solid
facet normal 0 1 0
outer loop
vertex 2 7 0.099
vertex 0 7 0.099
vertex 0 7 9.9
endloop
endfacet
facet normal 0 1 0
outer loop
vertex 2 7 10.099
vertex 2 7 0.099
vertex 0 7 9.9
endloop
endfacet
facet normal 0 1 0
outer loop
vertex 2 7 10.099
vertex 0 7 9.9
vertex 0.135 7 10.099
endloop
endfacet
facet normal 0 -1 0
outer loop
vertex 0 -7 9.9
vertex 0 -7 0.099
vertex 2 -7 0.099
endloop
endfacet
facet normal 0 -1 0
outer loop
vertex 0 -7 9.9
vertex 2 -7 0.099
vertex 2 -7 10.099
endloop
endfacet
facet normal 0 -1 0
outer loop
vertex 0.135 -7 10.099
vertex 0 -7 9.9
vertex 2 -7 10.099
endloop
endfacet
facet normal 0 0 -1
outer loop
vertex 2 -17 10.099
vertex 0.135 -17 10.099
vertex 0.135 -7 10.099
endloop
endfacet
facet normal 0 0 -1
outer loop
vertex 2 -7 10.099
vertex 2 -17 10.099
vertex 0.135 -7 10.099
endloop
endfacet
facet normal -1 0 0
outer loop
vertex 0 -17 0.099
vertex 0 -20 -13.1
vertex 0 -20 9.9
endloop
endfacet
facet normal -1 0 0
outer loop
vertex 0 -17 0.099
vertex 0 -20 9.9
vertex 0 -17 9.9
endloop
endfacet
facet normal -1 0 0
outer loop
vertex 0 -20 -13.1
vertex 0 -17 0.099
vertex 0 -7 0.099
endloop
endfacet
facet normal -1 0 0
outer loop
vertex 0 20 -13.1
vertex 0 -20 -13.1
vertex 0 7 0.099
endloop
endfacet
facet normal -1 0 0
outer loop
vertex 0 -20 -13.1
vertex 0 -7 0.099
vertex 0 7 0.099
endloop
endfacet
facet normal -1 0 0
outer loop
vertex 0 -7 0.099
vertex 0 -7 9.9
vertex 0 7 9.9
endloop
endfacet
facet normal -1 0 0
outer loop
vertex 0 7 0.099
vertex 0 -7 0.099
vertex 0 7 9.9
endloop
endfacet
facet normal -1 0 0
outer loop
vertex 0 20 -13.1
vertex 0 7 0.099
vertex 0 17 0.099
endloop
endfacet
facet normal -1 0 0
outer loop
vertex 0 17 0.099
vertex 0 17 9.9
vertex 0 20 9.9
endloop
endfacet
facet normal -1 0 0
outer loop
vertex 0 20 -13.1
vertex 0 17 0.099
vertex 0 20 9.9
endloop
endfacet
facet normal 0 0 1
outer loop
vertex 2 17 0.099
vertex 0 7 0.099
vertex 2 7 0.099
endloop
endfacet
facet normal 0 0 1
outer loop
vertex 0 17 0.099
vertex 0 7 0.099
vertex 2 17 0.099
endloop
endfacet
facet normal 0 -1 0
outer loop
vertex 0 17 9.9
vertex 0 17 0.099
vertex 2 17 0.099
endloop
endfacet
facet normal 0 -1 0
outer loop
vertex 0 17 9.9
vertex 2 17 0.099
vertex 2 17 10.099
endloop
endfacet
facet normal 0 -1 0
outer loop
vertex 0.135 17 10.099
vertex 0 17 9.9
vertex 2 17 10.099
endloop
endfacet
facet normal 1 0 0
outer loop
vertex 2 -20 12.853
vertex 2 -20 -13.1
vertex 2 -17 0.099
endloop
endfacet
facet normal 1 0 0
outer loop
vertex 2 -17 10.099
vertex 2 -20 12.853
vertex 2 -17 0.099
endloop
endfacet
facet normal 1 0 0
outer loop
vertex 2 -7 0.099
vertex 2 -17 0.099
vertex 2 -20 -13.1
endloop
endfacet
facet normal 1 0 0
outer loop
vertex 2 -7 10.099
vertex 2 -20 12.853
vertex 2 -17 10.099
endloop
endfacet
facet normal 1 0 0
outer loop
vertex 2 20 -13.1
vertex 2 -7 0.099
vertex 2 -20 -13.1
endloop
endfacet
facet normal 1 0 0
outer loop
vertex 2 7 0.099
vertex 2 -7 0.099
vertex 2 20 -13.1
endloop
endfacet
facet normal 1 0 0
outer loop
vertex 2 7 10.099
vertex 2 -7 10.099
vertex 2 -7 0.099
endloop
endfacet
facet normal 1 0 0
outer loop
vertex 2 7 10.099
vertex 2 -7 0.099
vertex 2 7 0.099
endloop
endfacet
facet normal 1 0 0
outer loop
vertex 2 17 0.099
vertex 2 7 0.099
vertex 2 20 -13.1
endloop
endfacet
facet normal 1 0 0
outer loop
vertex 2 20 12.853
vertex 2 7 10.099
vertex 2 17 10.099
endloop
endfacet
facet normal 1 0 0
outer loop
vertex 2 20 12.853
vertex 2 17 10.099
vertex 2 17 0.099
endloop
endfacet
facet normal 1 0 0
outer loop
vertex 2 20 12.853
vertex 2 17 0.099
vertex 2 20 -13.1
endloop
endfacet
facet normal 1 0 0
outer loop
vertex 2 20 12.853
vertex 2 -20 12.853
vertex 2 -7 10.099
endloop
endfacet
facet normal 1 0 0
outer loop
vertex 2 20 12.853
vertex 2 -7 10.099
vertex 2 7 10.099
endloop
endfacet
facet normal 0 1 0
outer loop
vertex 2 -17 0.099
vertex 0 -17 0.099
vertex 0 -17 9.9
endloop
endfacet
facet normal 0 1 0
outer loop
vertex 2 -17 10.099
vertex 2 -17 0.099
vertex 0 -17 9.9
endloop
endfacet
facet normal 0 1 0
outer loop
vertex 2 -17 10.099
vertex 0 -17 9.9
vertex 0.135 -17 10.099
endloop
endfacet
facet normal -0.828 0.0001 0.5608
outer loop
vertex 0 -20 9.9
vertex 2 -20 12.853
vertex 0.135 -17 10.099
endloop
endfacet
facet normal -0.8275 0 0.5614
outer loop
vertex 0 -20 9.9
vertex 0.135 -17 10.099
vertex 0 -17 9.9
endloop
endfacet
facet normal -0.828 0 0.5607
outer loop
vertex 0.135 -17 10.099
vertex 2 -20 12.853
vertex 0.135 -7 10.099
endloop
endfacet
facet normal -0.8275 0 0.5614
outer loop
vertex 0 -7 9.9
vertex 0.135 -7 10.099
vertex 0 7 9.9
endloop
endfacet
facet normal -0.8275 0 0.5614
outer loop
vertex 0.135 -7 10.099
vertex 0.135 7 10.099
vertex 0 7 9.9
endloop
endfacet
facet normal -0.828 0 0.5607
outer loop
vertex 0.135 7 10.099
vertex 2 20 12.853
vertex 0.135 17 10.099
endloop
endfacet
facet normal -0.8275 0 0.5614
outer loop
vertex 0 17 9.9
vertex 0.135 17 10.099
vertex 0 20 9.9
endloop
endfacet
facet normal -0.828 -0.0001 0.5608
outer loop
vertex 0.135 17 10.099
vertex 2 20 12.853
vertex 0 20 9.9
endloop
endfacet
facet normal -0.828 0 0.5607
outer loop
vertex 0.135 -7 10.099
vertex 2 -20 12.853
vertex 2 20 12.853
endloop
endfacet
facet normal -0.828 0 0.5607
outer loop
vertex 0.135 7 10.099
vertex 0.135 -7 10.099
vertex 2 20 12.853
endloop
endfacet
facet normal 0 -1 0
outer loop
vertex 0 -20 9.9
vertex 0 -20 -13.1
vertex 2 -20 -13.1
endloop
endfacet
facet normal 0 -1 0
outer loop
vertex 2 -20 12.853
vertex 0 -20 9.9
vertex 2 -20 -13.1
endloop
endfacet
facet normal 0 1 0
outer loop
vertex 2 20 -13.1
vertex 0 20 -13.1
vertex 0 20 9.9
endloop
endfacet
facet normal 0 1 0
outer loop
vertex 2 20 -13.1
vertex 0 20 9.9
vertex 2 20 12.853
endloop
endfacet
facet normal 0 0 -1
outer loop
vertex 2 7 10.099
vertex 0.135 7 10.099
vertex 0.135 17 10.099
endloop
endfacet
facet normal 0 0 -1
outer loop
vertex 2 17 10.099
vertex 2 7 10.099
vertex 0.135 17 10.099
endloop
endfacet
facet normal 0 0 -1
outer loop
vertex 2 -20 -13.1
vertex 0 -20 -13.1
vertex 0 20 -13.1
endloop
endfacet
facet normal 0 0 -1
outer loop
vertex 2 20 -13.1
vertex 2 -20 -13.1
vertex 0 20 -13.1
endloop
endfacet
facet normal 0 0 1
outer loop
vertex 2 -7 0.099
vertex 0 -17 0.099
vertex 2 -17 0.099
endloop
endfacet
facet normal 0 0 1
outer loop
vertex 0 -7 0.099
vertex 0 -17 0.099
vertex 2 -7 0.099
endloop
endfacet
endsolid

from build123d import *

# Parameters (mm, degrees)
F0_W        = 40
F0_H        = 26.199
F0_W_2      = 10
F0_H_2      = 10
F1_DEPTH    = 2
F2_T1_DEPTH = 56.5285930149


# Not quite as in the source:
# - a fillet or chamfer that OpenCascade refuses, or shapes differently, is made with other operations: its cross-section is extruded or revolved along the edge and cut away or added


with BuildPart() as f1:
    # F0 (on Right) → F1 (new body)
    with BuildSketch(Plane.YZ):
        Rectangle(F0_W, F0_H)
        with Locations((-12, 5.0995)):
            Rectangle(F0_W_2, F0_H_2, mode=Mode.SUBTRACT)
        with Locations((12, 5.0995)):
            Rectangle(F0_W_2, F0_H_2, mode=Mode.SUBTRACT)
    extrude(amount=F1_DEPTH)

    # F2: chamfer of 2.16713 x 3.199 on 1 edges, made by hand

    # F2_s2 → F2_t1 (cut)
    with BuildSketch(Plane.XZ.offset(-28.2642965075)):
        Polygon((2.16713, 13.0995), (0, 9.9005), (0, 13.0995), align=None)
    extrude(amount=F2_T1_DEPTH, mode=Mode.SUBTRACT)


solid = f1.part
